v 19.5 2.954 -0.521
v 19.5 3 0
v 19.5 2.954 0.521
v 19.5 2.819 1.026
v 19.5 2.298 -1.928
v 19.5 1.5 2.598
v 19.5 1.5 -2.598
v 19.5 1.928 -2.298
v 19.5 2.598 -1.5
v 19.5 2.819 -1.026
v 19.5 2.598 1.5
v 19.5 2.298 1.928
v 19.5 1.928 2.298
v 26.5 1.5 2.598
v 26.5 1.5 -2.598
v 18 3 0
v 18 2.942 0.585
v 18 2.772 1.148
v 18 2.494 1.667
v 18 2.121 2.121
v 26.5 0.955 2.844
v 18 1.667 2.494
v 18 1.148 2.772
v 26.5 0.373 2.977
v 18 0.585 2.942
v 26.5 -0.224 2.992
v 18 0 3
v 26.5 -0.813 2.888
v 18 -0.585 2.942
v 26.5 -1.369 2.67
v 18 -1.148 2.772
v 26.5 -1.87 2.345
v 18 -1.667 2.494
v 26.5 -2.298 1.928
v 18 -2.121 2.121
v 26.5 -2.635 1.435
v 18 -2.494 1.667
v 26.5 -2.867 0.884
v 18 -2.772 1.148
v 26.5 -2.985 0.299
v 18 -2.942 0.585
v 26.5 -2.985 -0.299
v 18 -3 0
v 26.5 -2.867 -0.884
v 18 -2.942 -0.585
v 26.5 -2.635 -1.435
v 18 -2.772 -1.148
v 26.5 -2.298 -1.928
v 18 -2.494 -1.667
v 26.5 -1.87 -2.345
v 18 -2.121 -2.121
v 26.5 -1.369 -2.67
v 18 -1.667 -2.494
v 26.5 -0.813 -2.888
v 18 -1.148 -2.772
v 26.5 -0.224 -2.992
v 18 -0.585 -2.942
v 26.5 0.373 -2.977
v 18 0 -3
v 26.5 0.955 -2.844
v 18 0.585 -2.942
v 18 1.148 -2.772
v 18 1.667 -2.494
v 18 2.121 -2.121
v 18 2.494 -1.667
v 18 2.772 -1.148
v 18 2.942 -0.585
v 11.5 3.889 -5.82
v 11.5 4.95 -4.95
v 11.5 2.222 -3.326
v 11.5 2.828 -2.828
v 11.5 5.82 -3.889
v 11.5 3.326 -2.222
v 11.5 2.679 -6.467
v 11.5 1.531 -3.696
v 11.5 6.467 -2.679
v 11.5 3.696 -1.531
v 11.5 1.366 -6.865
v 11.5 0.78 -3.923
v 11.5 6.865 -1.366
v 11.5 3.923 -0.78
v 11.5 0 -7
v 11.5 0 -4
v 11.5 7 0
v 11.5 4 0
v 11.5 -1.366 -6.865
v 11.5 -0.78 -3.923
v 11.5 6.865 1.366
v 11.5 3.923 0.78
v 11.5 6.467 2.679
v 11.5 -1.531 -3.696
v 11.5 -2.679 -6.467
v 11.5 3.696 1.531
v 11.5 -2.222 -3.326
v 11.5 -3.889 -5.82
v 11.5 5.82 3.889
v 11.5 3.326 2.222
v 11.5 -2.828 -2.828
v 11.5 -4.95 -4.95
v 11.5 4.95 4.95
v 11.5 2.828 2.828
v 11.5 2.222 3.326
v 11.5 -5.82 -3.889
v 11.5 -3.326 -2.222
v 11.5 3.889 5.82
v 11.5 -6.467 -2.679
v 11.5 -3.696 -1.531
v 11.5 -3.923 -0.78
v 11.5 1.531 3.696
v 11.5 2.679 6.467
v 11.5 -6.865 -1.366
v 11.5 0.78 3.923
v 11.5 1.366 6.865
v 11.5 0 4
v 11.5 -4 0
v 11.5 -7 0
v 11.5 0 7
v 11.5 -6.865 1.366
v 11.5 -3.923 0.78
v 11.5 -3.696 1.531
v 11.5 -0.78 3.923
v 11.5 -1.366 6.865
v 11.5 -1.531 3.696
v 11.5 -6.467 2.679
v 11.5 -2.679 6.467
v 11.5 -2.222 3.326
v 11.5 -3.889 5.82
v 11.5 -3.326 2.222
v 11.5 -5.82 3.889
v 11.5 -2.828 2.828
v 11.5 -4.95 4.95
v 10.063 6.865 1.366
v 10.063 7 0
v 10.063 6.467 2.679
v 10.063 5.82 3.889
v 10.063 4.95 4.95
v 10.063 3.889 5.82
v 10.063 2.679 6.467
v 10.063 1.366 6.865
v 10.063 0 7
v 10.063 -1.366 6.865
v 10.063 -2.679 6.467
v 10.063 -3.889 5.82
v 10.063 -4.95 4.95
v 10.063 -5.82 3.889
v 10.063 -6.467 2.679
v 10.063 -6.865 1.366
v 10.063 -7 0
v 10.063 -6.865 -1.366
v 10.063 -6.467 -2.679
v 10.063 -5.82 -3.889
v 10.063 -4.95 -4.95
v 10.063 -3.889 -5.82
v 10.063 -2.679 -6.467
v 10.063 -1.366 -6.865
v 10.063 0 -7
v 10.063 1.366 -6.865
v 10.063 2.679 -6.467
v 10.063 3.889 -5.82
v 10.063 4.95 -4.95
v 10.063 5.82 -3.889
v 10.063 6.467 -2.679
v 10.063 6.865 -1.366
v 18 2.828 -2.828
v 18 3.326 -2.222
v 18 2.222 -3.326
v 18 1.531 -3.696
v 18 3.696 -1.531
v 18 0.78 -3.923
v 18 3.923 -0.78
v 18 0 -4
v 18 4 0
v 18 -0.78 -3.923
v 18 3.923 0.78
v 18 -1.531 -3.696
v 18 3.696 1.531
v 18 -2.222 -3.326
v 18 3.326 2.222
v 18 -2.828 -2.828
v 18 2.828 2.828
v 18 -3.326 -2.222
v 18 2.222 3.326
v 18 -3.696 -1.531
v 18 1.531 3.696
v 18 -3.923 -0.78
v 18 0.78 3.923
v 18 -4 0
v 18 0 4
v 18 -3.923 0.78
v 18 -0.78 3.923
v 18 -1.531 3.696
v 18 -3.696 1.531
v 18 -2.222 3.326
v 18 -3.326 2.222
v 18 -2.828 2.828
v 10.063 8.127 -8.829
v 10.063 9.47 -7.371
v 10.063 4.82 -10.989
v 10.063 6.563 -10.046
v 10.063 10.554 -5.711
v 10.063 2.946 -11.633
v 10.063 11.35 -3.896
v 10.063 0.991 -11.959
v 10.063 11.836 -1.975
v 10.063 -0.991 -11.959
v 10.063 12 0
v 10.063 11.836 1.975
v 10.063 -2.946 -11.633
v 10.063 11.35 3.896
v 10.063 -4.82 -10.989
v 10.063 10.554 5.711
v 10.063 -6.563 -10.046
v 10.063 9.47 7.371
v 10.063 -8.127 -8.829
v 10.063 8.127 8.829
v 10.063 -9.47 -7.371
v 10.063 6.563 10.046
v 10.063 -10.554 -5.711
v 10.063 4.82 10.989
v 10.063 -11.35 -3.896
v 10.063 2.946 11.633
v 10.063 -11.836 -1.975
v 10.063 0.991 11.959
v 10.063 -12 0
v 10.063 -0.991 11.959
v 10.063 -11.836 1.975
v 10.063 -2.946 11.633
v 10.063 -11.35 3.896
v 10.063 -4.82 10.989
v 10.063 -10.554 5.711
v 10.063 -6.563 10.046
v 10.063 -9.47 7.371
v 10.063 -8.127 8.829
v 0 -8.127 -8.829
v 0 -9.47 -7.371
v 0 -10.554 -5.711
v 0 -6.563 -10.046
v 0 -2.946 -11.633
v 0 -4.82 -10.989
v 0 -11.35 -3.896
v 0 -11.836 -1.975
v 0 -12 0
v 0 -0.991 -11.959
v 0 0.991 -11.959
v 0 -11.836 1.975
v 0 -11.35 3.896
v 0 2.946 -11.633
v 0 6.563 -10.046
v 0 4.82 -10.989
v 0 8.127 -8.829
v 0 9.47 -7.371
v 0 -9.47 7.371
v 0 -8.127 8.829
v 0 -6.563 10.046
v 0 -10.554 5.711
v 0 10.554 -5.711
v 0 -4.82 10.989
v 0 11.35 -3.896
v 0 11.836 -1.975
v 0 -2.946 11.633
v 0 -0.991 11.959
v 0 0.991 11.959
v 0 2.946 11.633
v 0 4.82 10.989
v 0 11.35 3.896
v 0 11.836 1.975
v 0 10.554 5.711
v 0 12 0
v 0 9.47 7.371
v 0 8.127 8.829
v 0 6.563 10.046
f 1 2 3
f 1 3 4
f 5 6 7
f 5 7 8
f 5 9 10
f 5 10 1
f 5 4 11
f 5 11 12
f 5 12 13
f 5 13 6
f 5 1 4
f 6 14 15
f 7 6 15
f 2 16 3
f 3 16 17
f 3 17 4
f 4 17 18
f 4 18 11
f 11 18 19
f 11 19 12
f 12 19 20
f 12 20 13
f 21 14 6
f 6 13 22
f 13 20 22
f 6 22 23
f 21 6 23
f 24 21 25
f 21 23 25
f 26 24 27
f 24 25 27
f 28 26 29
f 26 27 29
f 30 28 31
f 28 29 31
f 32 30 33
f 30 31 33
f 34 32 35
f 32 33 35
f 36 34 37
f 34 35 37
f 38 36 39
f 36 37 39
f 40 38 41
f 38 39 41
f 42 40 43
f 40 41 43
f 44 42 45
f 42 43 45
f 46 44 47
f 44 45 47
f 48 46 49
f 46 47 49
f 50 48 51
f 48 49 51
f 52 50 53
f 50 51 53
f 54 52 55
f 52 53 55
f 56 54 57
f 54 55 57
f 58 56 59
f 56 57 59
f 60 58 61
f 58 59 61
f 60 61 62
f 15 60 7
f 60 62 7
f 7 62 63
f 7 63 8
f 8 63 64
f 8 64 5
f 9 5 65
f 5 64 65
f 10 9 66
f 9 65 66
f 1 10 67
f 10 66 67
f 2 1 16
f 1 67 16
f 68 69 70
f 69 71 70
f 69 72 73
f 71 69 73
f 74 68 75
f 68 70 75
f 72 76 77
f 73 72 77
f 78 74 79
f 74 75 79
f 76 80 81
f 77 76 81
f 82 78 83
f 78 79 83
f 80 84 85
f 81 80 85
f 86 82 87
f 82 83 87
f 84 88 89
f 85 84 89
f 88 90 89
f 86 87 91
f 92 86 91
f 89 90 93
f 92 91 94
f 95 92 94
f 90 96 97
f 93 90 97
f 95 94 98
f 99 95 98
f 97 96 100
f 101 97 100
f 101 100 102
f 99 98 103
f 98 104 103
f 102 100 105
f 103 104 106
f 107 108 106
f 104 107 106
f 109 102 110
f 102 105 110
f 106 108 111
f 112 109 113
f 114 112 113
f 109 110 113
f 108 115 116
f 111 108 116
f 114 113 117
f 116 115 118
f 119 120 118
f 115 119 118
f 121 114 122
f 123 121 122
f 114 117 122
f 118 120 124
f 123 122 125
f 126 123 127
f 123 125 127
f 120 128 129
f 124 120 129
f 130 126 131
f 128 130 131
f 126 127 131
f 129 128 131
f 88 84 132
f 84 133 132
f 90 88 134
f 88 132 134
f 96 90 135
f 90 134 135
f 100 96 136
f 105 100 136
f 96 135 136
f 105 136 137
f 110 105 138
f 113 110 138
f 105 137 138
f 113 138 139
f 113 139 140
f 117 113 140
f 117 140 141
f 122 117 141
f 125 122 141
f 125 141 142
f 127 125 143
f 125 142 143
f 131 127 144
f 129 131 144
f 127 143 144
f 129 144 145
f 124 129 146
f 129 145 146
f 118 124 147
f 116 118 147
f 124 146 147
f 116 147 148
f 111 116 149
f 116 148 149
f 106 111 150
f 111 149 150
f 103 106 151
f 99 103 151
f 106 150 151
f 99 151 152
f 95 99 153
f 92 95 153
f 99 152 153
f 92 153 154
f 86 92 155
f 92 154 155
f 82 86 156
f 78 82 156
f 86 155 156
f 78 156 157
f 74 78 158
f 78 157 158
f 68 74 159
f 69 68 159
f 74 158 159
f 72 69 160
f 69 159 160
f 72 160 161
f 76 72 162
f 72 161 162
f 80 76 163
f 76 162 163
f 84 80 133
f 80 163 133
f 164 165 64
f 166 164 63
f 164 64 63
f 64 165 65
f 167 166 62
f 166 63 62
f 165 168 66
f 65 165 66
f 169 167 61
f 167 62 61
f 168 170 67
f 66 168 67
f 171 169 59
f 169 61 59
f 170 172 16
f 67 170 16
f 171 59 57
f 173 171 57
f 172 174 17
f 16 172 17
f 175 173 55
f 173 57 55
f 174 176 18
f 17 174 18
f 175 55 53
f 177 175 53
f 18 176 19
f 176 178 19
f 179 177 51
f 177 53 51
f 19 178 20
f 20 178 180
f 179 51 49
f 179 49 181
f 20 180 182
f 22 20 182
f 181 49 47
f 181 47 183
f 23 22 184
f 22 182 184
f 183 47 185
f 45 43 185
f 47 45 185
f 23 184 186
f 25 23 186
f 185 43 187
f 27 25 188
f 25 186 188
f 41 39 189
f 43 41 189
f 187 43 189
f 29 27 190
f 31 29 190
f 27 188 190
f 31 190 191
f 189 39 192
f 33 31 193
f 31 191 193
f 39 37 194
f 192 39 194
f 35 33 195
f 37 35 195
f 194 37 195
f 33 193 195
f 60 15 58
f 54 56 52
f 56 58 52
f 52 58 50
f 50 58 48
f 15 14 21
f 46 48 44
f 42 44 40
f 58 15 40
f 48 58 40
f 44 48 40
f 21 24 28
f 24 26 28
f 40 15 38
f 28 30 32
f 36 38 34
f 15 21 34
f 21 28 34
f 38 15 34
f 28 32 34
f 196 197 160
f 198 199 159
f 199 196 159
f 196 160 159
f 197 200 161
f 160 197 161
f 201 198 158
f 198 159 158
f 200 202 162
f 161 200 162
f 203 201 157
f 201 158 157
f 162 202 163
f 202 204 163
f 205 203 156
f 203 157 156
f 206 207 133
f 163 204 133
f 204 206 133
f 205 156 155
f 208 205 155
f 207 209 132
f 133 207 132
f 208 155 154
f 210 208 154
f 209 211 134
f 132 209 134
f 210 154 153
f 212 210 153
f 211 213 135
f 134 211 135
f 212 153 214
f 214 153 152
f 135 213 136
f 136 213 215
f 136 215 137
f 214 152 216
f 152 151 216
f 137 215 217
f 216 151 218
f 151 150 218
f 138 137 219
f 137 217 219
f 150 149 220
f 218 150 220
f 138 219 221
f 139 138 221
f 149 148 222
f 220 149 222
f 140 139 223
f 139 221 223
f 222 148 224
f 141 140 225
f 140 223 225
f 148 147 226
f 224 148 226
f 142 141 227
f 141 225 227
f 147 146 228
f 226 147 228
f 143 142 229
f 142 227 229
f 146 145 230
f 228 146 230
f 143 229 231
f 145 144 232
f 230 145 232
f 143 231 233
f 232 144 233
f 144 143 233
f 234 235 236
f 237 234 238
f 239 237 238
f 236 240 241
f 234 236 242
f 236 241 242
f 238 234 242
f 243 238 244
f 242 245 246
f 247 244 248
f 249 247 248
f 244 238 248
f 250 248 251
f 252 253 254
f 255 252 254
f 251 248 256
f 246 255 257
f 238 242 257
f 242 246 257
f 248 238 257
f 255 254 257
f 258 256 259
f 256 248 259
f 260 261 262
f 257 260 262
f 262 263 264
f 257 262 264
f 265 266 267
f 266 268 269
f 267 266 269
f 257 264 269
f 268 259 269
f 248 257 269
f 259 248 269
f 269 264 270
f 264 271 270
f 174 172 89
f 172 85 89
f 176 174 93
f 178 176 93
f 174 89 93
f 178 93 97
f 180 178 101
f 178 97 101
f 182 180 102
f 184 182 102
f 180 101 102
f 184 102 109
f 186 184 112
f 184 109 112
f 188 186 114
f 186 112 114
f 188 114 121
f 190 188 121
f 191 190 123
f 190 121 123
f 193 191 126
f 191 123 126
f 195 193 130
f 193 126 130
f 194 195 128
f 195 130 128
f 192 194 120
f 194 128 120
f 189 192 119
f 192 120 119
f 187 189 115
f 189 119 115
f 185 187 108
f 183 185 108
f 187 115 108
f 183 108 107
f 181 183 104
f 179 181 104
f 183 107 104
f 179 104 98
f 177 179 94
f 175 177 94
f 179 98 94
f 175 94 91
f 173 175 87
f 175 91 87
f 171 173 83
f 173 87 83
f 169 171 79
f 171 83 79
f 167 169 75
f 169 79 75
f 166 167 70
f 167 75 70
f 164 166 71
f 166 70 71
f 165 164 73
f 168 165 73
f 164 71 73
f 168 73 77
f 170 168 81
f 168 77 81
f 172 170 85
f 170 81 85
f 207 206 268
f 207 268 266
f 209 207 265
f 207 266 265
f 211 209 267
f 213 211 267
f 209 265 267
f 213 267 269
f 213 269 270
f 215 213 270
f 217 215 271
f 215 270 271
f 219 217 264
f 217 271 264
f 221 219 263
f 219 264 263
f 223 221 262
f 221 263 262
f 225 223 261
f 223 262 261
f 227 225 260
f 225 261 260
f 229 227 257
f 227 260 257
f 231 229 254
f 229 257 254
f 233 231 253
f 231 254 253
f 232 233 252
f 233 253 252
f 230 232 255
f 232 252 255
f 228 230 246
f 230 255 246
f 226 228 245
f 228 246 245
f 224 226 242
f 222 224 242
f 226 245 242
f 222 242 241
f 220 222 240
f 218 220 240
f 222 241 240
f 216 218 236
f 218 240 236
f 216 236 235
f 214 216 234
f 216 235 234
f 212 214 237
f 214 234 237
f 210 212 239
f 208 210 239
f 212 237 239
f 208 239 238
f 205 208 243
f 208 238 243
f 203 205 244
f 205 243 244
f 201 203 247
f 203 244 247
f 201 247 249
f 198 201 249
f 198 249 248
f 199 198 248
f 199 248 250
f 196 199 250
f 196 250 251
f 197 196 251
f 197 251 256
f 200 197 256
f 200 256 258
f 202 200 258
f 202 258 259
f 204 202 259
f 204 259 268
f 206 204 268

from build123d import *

# Parameters (mm, degrees)
CUT_EXTRUDE1_DEPTH = 7


with BuildPart() as part:
    # Sketch1 → Revolve1 (revolve)
    with BuildSketch(Plane.XY):
        Polygon((0, 0), (26.5, 0), (26.5, 3), (18, 3), (18, 4), (11.5, 4), (11.5, 7), (10.063118771, 7), (10.063118771, 12), (0, 12), align=None)
    revolve(axis=Axis((0, 0, 0), (1, 0, 0)))

    # Sketch2 → Cut-Extrude1 (cut)
    with BuildSketch(Plane(origin=(26.5, 0, 0), x_dir=(0, 0, -1), z_dir=(1, 0, 0))):
        with BuildLine():
            Line((-2.598076211, 1.5), (2.598076211, 1.5))
            ThreePointArc((2.598076211, 1.5), (0, 3), (-2.598076211, 1.5))
        make_face()
    extrude(amount=-CUT_EXTRUDE1_DEPTH, mode=Mode.SUBTRACT)


solid = part.part
